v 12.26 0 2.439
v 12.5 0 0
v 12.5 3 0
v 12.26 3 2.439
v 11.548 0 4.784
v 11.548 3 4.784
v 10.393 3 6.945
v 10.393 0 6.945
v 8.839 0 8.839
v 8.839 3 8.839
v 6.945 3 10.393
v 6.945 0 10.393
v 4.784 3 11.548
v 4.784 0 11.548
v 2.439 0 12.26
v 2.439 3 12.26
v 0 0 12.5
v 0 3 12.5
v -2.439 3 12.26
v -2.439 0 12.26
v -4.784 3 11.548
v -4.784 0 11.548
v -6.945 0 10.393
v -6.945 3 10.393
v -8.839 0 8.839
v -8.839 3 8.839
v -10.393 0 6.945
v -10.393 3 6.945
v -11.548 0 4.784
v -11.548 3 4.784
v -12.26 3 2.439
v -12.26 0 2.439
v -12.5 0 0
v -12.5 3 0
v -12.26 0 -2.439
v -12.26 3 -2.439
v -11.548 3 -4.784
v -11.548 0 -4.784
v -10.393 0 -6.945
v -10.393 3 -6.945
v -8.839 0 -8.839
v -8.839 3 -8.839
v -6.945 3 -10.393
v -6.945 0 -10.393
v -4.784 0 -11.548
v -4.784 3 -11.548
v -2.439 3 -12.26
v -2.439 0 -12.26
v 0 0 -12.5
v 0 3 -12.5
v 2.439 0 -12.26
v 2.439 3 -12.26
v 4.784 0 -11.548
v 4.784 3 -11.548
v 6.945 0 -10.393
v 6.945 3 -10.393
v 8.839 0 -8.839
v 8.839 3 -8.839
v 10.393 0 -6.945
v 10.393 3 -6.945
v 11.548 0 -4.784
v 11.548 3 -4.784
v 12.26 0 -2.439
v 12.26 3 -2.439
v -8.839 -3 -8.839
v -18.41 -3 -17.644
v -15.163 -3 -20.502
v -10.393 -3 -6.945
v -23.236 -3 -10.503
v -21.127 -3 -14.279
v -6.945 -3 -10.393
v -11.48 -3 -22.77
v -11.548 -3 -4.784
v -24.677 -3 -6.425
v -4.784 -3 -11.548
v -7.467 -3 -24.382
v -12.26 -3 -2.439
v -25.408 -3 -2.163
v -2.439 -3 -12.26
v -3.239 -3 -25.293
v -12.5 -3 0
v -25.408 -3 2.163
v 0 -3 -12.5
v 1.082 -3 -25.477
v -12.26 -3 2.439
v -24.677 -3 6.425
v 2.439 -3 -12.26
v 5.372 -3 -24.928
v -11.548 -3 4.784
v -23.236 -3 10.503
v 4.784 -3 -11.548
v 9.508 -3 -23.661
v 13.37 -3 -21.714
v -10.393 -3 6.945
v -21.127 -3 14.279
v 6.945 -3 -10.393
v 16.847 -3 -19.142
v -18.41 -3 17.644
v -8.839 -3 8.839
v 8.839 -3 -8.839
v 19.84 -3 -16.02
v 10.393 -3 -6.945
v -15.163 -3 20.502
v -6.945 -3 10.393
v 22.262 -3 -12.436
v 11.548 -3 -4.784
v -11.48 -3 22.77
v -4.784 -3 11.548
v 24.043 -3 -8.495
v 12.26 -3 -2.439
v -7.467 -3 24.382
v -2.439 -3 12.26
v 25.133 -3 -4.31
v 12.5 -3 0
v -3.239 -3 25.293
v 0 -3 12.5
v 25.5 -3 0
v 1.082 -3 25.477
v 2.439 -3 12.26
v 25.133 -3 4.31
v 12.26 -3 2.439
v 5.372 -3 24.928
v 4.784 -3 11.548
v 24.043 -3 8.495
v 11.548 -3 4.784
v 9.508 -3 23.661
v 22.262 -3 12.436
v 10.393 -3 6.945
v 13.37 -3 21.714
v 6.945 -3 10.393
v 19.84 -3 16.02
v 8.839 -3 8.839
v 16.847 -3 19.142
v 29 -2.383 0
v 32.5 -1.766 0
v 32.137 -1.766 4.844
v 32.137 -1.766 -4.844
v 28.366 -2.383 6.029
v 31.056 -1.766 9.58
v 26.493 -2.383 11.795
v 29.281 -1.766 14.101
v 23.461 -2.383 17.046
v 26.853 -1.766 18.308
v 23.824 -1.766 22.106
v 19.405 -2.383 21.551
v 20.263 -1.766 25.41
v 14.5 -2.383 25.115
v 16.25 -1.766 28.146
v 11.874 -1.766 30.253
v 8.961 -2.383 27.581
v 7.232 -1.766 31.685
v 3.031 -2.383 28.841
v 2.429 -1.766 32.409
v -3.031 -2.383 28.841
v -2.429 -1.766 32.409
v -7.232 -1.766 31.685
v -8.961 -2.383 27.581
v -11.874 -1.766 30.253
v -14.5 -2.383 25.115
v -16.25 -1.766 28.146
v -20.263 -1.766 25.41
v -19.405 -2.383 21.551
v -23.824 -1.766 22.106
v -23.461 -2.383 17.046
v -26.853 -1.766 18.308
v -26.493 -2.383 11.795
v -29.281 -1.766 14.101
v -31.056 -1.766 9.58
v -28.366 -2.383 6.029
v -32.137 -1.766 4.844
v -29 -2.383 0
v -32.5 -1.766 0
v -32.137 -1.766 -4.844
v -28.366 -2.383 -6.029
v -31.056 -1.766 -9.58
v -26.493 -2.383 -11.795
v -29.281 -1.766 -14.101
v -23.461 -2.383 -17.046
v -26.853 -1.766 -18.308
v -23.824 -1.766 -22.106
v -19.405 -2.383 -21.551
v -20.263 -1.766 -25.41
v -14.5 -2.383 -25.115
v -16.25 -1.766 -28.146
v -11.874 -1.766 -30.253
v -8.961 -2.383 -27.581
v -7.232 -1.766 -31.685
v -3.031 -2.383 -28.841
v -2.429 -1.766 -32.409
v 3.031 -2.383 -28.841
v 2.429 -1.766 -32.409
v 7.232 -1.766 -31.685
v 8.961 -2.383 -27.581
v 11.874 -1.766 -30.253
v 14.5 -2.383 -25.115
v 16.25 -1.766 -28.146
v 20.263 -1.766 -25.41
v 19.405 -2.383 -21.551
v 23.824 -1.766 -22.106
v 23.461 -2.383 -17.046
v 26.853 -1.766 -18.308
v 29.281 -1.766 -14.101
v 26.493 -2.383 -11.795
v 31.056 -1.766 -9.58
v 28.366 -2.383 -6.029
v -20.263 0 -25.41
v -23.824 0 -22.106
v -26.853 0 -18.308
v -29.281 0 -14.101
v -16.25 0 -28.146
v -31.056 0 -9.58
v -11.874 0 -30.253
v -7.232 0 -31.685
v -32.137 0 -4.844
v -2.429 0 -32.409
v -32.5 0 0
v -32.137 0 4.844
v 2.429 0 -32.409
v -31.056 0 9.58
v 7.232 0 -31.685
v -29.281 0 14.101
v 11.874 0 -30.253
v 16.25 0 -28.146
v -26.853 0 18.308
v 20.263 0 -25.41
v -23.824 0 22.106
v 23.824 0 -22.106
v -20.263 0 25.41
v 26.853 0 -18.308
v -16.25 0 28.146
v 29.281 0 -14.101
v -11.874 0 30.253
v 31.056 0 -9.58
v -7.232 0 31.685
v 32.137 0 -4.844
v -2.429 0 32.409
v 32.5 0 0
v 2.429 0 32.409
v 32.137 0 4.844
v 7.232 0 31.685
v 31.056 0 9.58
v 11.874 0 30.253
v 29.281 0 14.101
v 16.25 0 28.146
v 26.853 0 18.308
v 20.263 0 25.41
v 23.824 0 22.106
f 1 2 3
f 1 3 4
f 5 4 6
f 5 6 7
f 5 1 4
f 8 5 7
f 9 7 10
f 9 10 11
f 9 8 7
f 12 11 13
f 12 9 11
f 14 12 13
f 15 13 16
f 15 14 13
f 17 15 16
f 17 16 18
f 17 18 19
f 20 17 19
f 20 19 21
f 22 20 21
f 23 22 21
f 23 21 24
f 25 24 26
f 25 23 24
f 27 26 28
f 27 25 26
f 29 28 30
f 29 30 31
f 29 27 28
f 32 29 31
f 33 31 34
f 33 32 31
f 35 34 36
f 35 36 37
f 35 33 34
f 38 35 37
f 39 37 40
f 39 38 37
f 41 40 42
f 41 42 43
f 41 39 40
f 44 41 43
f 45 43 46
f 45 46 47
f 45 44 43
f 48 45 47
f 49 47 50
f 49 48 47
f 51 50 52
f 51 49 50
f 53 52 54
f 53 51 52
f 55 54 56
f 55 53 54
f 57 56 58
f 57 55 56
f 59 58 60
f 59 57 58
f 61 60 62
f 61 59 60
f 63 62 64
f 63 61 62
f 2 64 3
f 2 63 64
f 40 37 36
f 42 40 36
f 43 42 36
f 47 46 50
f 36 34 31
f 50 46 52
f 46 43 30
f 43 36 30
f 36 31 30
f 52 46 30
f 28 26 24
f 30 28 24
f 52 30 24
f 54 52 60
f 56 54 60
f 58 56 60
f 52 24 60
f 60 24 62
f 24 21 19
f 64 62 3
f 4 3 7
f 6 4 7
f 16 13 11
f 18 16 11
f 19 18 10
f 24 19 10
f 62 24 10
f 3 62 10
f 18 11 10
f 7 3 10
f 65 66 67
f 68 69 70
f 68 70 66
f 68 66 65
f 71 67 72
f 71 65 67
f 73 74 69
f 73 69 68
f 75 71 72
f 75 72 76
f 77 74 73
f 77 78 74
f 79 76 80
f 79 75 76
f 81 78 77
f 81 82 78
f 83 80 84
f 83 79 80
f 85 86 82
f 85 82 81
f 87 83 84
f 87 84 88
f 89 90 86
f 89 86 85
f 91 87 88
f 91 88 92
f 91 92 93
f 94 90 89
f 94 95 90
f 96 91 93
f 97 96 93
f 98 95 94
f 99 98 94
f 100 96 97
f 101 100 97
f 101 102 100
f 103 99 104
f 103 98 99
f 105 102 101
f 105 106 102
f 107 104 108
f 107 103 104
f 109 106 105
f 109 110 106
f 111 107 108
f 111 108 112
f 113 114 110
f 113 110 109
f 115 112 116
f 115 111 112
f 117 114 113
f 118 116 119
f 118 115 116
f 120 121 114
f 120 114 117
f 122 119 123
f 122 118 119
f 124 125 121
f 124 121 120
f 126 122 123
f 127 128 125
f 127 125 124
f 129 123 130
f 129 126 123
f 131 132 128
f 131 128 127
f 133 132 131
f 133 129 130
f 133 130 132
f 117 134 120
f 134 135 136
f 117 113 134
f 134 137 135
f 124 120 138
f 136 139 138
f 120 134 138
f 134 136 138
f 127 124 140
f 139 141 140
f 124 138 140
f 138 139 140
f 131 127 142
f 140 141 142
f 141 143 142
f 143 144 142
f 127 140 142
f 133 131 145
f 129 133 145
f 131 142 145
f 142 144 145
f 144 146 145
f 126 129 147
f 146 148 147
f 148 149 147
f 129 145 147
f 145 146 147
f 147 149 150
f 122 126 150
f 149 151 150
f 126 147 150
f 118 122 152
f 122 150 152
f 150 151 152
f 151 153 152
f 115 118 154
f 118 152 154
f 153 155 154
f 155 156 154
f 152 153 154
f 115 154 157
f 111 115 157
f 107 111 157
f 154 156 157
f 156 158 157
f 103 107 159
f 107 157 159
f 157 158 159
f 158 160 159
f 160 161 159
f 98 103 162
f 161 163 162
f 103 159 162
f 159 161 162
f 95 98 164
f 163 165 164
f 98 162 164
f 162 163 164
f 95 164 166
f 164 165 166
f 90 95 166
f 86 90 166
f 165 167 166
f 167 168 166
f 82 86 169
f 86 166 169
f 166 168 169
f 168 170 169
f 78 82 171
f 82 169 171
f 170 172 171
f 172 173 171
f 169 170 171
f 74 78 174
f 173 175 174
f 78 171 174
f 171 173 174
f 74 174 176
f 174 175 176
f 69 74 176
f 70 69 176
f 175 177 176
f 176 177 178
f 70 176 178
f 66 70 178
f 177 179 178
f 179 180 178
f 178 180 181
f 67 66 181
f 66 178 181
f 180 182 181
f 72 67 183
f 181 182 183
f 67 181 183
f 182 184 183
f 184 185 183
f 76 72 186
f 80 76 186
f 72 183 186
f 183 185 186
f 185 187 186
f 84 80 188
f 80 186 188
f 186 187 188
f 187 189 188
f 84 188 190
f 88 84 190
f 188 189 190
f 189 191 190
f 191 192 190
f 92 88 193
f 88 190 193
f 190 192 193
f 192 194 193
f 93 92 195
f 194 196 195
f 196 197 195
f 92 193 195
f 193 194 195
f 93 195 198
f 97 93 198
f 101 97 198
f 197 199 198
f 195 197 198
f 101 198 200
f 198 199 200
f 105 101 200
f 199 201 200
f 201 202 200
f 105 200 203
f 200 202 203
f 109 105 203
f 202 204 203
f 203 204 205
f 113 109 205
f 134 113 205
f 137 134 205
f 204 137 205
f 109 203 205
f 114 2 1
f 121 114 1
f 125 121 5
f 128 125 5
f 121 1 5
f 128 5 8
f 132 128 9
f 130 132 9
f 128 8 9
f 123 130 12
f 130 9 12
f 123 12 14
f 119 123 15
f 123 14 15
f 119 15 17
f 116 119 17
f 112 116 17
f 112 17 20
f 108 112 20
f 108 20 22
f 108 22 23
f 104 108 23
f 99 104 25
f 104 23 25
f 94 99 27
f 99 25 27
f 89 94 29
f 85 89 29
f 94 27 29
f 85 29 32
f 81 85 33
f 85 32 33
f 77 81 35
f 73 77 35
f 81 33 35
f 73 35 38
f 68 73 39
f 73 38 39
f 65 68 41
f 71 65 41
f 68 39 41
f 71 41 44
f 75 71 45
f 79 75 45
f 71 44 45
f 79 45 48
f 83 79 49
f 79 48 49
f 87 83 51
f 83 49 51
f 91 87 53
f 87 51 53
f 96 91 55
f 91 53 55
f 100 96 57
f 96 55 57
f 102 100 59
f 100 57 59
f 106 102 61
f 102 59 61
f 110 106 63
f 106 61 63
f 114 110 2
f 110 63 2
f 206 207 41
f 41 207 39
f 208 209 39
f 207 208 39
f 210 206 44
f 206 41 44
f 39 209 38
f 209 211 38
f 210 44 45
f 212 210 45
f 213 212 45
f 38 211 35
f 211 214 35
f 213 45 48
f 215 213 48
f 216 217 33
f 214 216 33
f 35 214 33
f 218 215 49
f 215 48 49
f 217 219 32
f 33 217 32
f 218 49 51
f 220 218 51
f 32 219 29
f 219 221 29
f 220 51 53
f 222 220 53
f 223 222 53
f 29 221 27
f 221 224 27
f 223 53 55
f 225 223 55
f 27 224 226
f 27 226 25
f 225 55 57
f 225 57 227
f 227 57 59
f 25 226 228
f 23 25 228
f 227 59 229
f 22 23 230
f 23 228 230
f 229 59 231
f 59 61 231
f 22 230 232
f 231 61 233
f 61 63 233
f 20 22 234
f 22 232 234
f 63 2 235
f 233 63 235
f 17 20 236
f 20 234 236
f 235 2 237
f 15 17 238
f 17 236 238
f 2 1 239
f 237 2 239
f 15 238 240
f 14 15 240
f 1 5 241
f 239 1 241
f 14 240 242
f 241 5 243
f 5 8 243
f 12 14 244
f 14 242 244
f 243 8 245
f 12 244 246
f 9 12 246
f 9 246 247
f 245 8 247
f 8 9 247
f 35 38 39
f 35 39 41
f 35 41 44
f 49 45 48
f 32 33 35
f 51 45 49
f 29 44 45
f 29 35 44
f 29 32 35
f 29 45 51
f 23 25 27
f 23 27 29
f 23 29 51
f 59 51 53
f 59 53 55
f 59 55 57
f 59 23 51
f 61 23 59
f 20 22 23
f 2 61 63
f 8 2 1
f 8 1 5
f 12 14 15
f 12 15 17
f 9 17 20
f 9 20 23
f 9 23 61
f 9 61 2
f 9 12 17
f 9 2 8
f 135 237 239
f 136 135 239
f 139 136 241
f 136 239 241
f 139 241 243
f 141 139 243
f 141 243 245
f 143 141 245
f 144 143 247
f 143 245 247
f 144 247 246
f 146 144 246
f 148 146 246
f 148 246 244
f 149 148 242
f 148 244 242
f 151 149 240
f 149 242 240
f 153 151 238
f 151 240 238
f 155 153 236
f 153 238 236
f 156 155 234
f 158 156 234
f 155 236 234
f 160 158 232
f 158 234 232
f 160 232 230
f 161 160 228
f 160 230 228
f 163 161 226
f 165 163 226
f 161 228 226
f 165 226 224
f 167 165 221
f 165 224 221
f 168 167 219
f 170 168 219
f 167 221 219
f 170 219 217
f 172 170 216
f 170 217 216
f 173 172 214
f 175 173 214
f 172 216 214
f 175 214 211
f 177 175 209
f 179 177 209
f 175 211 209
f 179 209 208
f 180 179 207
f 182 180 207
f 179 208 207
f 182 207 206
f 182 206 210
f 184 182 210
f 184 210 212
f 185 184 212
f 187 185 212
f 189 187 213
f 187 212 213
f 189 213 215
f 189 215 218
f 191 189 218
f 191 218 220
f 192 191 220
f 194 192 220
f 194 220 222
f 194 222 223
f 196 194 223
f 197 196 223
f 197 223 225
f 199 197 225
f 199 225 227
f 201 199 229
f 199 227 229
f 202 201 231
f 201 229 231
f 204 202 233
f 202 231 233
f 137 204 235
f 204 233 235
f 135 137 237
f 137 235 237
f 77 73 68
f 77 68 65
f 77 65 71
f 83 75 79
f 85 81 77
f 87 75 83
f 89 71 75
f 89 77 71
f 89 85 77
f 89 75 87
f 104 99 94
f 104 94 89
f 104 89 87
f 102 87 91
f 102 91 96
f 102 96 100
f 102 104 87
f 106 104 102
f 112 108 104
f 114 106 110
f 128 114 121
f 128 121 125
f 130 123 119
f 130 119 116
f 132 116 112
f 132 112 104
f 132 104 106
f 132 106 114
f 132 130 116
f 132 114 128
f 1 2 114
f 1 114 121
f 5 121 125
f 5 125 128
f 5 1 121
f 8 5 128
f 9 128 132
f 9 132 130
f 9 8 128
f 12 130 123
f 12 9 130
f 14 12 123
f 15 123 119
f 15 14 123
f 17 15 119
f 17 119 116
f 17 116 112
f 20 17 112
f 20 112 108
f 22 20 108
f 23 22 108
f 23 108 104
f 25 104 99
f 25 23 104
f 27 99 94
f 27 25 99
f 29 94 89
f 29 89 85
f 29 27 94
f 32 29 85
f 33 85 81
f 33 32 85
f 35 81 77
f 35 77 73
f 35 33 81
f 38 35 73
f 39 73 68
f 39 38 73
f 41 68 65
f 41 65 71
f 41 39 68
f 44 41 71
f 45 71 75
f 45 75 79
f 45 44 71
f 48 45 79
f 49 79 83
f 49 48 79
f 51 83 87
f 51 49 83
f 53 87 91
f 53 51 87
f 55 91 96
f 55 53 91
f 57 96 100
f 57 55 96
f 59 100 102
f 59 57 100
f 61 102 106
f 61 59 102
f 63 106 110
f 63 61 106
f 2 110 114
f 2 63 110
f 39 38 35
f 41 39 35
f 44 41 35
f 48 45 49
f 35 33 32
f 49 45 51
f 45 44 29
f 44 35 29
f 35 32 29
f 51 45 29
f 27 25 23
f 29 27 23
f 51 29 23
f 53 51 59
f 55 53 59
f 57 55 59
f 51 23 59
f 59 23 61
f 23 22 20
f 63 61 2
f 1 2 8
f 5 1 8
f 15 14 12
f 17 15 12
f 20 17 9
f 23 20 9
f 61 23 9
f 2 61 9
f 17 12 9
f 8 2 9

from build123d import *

# Parameters (mm, degrees)
F0_R     = 12.5
F1_DEPTH = 3
F0_R_2   = 32.5
F2_DEPTH = 3
F3_DEPTH = 3
F4_SIZE2 = 1.234288865
F4_SIZE  = 7


with BuildPart() as f1:
    # F0 (on Front) → F1 (new body)
    with BuildSketch(Plane.XZ):
        Circle(F0_R)
    extrude(amount=-F1_DEPTH)


with BuildPart() as f2:
    # F0 (on Front) → F2 (new body)
    with BuildSketch(Plane.XZ):
        Circle(F0_R_2)
        Circle(F0_R, mode=Mode.SUBTRACT)
    extrude(amount=F2_DEPTH)

    # F4
    f4_edges = [f2.edges().sort_by_distance(p)[0] for p in [
        (-32.5, -3, 0),
    ]]
    f4_side = f2.faces().sort_by_distance((-31.580761, -3, 0))[0]
    chamfer(f4_edges, length=F4_SIZE, length2=F4_SIZE2, reference=f4_side)


with BuildPart() as f3:
    # F3 (new): a face of the model
    f3_faces = [f1.part.faces().sort_by_distance(p)[0] for p in [
        (0, 0, 0),
    ]]
    extrude(f3_faces, amount=F3_DEPTH)


solid = Compound([f1.part, f2.part, f3.part])
